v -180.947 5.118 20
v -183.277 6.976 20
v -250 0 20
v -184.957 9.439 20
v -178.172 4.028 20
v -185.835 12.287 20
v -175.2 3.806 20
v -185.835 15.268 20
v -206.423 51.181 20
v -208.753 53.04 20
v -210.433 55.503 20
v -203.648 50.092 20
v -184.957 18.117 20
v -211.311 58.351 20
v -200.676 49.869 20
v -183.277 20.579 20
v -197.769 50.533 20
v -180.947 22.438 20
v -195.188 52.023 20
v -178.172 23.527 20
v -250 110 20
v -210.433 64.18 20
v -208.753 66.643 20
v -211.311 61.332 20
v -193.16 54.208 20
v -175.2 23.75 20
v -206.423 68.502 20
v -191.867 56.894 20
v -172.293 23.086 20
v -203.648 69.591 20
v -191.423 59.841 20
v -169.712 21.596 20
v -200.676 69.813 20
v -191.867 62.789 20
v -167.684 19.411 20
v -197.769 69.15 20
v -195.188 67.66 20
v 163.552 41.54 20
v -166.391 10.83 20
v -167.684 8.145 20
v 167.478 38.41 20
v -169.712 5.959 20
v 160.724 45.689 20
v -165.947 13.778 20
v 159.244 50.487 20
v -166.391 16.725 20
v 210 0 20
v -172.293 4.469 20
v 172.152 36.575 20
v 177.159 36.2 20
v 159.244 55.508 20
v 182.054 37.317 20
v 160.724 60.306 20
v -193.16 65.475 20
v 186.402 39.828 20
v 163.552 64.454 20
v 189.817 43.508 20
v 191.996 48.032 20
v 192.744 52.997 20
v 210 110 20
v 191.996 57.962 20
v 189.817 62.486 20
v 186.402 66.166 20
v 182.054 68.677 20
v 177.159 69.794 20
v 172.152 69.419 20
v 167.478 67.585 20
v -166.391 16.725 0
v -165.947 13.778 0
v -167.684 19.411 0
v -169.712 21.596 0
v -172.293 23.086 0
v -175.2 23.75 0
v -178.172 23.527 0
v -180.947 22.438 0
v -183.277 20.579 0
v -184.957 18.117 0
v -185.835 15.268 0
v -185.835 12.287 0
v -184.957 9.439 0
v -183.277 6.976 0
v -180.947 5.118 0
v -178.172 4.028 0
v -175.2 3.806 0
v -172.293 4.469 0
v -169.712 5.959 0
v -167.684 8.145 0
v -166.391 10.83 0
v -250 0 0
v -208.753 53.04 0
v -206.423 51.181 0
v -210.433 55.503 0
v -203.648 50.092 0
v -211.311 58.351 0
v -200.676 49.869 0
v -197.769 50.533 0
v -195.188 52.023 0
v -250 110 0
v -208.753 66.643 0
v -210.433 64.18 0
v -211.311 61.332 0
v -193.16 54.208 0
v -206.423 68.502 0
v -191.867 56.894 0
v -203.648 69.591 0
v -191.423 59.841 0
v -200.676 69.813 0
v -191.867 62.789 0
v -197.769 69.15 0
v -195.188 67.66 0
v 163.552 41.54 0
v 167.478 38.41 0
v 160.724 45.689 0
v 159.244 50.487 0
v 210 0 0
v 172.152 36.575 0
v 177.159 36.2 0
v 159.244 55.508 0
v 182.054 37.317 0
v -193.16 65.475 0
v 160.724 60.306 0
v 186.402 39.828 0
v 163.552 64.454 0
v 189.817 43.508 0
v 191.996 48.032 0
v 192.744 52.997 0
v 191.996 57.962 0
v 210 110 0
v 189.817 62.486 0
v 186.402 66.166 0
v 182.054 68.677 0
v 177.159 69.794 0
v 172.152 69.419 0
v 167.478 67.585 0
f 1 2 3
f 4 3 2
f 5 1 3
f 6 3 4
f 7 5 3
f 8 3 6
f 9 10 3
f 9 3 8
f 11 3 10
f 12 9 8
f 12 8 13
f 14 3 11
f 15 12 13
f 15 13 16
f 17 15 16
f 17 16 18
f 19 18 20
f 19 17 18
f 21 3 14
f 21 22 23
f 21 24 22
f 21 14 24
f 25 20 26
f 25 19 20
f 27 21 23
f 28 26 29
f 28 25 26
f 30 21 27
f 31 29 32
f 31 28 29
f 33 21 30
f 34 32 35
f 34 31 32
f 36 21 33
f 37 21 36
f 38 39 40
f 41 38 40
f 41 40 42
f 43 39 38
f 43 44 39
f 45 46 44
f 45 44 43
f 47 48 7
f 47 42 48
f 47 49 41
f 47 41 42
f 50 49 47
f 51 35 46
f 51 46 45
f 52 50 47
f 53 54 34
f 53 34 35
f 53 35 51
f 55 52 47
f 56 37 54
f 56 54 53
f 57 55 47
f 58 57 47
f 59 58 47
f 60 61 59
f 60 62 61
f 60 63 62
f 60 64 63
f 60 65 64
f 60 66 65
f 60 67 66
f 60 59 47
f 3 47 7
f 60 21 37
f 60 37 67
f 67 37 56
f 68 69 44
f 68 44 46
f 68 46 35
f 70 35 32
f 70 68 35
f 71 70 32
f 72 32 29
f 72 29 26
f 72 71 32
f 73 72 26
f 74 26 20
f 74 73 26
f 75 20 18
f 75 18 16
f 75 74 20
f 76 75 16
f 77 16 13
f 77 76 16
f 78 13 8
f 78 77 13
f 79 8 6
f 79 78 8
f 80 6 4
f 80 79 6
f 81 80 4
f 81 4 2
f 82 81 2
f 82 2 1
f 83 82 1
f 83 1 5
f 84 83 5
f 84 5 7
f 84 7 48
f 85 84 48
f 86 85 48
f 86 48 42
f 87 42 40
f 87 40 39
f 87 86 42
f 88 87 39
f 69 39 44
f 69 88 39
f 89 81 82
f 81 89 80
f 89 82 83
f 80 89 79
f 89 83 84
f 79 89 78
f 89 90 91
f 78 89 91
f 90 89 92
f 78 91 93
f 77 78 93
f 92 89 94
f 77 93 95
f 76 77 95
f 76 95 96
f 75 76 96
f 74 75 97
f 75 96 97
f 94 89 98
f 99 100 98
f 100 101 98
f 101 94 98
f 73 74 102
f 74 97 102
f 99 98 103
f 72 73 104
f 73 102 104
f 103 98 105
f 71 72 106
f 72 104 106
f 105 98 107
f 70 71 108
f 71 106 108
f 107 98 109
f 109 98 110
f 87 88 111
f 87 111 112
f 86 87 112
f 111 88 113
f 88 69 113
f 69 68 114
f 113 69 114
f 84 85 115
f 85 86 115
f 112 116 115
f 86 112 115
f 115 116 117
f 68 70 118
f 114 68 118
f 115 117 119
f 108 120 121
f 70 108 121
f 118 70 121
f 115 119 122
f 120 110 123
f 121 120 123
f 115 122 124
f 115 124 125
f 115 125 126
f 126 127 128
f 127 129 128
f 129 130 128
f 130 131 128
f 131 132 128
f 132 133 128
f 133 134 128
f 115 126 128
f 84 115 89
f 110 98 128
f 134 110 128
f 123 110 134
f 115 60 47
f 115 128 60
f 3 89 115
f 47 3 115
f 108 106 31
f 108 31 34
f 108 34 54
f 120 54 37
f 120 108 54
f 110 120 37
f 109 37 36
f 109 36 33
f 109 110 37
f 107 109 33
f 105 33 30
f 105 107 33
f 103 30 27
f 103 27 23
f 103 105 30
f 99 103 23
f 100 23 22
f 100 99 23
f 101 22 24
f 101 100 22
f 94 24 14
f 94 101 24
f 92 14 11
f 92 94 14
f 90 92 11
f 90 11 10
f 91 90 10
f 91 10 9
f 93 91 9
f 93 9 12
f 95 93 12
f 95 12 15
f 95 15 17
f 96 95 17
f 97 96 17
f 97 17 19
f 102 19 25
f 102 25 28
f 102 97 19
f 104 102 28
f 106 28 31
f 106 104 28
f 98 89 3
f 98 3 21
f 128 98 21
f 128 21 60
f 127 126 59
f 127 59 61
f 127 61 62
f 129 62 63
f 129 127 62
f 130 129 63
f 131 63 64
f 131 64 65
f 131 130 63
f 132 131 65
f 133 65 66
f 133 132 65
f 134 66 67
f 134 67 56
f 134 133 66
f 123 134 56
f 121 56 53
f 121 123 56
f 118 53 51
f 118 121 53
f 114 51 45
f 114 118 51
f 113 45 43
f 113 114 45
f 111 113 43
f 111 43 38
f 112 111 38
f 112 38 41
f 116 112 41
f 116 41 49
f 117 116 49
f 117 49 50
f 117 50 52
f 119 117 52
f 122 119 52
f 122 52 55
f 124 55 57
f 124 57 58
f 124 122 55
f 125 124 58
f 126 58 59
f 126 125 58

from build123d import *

# Parameters (mm, degrees)
SKETCH_1_W               = 500
SKETCH_1_H               = 110
SKETCH_1_R               = 16.844258013
SKETCH_1_R_2             = 10
EXTRUDE_1_DEPTH          = 20
CUT_EXTRUDE_1_DEPTH      = 274.861278753
CUT_EXTRUDE_1_DEPTH_BACK = 274.861278753


with BuildPart() as part:
    # 草图1 → 凸台-拉伸1 (new body)
    with BuildSketch(Plane.XY):
        with Locations((0, 55)):
            Rectangle(SKETCH_1_W, SKETCH_1_H)
        with Locations((175.900033463, 52.997126546)):
            Circle(SKETCH_1_R, mode=Mode.SUBTRACT)
        with Locations((-175.9468126, 13.777754179)):
            Circle(SKETCH_1_R_2, mode=Mode.SUBTRACT)
        with Locations((-201.422811837, 59.841384559)):
            Circle(SKETCH_1_R_2, mode=Mode.SUBTRACT)
    extrude(amount=EXTRUDE_1_DEPTH)

    # 草图2 → 切除-拉伸1 (cut, two sides: drawn at the far end of the back side and taken through both)
    with BuildSketch(Plane.XY.offset(20).offset(-CUT_EXTRUDE_1_DEPTH_BACK)):
        Polygon((1297.820746048, 138.80913238), (250, 138.80913238), (210, 138.80913238), (210, -127.893820907), (210, -1175.714566955), (1824.507064902, -2511.783502593), (2912.32781095, -1197.259803259), align=None)
    extrude(amount=CUT_EXTRUDE_1_DEPTH + CUT_EXTRUDE_1_DEPTH_BACK, mode=Mode.SUBTRACT)


solid = part.part
